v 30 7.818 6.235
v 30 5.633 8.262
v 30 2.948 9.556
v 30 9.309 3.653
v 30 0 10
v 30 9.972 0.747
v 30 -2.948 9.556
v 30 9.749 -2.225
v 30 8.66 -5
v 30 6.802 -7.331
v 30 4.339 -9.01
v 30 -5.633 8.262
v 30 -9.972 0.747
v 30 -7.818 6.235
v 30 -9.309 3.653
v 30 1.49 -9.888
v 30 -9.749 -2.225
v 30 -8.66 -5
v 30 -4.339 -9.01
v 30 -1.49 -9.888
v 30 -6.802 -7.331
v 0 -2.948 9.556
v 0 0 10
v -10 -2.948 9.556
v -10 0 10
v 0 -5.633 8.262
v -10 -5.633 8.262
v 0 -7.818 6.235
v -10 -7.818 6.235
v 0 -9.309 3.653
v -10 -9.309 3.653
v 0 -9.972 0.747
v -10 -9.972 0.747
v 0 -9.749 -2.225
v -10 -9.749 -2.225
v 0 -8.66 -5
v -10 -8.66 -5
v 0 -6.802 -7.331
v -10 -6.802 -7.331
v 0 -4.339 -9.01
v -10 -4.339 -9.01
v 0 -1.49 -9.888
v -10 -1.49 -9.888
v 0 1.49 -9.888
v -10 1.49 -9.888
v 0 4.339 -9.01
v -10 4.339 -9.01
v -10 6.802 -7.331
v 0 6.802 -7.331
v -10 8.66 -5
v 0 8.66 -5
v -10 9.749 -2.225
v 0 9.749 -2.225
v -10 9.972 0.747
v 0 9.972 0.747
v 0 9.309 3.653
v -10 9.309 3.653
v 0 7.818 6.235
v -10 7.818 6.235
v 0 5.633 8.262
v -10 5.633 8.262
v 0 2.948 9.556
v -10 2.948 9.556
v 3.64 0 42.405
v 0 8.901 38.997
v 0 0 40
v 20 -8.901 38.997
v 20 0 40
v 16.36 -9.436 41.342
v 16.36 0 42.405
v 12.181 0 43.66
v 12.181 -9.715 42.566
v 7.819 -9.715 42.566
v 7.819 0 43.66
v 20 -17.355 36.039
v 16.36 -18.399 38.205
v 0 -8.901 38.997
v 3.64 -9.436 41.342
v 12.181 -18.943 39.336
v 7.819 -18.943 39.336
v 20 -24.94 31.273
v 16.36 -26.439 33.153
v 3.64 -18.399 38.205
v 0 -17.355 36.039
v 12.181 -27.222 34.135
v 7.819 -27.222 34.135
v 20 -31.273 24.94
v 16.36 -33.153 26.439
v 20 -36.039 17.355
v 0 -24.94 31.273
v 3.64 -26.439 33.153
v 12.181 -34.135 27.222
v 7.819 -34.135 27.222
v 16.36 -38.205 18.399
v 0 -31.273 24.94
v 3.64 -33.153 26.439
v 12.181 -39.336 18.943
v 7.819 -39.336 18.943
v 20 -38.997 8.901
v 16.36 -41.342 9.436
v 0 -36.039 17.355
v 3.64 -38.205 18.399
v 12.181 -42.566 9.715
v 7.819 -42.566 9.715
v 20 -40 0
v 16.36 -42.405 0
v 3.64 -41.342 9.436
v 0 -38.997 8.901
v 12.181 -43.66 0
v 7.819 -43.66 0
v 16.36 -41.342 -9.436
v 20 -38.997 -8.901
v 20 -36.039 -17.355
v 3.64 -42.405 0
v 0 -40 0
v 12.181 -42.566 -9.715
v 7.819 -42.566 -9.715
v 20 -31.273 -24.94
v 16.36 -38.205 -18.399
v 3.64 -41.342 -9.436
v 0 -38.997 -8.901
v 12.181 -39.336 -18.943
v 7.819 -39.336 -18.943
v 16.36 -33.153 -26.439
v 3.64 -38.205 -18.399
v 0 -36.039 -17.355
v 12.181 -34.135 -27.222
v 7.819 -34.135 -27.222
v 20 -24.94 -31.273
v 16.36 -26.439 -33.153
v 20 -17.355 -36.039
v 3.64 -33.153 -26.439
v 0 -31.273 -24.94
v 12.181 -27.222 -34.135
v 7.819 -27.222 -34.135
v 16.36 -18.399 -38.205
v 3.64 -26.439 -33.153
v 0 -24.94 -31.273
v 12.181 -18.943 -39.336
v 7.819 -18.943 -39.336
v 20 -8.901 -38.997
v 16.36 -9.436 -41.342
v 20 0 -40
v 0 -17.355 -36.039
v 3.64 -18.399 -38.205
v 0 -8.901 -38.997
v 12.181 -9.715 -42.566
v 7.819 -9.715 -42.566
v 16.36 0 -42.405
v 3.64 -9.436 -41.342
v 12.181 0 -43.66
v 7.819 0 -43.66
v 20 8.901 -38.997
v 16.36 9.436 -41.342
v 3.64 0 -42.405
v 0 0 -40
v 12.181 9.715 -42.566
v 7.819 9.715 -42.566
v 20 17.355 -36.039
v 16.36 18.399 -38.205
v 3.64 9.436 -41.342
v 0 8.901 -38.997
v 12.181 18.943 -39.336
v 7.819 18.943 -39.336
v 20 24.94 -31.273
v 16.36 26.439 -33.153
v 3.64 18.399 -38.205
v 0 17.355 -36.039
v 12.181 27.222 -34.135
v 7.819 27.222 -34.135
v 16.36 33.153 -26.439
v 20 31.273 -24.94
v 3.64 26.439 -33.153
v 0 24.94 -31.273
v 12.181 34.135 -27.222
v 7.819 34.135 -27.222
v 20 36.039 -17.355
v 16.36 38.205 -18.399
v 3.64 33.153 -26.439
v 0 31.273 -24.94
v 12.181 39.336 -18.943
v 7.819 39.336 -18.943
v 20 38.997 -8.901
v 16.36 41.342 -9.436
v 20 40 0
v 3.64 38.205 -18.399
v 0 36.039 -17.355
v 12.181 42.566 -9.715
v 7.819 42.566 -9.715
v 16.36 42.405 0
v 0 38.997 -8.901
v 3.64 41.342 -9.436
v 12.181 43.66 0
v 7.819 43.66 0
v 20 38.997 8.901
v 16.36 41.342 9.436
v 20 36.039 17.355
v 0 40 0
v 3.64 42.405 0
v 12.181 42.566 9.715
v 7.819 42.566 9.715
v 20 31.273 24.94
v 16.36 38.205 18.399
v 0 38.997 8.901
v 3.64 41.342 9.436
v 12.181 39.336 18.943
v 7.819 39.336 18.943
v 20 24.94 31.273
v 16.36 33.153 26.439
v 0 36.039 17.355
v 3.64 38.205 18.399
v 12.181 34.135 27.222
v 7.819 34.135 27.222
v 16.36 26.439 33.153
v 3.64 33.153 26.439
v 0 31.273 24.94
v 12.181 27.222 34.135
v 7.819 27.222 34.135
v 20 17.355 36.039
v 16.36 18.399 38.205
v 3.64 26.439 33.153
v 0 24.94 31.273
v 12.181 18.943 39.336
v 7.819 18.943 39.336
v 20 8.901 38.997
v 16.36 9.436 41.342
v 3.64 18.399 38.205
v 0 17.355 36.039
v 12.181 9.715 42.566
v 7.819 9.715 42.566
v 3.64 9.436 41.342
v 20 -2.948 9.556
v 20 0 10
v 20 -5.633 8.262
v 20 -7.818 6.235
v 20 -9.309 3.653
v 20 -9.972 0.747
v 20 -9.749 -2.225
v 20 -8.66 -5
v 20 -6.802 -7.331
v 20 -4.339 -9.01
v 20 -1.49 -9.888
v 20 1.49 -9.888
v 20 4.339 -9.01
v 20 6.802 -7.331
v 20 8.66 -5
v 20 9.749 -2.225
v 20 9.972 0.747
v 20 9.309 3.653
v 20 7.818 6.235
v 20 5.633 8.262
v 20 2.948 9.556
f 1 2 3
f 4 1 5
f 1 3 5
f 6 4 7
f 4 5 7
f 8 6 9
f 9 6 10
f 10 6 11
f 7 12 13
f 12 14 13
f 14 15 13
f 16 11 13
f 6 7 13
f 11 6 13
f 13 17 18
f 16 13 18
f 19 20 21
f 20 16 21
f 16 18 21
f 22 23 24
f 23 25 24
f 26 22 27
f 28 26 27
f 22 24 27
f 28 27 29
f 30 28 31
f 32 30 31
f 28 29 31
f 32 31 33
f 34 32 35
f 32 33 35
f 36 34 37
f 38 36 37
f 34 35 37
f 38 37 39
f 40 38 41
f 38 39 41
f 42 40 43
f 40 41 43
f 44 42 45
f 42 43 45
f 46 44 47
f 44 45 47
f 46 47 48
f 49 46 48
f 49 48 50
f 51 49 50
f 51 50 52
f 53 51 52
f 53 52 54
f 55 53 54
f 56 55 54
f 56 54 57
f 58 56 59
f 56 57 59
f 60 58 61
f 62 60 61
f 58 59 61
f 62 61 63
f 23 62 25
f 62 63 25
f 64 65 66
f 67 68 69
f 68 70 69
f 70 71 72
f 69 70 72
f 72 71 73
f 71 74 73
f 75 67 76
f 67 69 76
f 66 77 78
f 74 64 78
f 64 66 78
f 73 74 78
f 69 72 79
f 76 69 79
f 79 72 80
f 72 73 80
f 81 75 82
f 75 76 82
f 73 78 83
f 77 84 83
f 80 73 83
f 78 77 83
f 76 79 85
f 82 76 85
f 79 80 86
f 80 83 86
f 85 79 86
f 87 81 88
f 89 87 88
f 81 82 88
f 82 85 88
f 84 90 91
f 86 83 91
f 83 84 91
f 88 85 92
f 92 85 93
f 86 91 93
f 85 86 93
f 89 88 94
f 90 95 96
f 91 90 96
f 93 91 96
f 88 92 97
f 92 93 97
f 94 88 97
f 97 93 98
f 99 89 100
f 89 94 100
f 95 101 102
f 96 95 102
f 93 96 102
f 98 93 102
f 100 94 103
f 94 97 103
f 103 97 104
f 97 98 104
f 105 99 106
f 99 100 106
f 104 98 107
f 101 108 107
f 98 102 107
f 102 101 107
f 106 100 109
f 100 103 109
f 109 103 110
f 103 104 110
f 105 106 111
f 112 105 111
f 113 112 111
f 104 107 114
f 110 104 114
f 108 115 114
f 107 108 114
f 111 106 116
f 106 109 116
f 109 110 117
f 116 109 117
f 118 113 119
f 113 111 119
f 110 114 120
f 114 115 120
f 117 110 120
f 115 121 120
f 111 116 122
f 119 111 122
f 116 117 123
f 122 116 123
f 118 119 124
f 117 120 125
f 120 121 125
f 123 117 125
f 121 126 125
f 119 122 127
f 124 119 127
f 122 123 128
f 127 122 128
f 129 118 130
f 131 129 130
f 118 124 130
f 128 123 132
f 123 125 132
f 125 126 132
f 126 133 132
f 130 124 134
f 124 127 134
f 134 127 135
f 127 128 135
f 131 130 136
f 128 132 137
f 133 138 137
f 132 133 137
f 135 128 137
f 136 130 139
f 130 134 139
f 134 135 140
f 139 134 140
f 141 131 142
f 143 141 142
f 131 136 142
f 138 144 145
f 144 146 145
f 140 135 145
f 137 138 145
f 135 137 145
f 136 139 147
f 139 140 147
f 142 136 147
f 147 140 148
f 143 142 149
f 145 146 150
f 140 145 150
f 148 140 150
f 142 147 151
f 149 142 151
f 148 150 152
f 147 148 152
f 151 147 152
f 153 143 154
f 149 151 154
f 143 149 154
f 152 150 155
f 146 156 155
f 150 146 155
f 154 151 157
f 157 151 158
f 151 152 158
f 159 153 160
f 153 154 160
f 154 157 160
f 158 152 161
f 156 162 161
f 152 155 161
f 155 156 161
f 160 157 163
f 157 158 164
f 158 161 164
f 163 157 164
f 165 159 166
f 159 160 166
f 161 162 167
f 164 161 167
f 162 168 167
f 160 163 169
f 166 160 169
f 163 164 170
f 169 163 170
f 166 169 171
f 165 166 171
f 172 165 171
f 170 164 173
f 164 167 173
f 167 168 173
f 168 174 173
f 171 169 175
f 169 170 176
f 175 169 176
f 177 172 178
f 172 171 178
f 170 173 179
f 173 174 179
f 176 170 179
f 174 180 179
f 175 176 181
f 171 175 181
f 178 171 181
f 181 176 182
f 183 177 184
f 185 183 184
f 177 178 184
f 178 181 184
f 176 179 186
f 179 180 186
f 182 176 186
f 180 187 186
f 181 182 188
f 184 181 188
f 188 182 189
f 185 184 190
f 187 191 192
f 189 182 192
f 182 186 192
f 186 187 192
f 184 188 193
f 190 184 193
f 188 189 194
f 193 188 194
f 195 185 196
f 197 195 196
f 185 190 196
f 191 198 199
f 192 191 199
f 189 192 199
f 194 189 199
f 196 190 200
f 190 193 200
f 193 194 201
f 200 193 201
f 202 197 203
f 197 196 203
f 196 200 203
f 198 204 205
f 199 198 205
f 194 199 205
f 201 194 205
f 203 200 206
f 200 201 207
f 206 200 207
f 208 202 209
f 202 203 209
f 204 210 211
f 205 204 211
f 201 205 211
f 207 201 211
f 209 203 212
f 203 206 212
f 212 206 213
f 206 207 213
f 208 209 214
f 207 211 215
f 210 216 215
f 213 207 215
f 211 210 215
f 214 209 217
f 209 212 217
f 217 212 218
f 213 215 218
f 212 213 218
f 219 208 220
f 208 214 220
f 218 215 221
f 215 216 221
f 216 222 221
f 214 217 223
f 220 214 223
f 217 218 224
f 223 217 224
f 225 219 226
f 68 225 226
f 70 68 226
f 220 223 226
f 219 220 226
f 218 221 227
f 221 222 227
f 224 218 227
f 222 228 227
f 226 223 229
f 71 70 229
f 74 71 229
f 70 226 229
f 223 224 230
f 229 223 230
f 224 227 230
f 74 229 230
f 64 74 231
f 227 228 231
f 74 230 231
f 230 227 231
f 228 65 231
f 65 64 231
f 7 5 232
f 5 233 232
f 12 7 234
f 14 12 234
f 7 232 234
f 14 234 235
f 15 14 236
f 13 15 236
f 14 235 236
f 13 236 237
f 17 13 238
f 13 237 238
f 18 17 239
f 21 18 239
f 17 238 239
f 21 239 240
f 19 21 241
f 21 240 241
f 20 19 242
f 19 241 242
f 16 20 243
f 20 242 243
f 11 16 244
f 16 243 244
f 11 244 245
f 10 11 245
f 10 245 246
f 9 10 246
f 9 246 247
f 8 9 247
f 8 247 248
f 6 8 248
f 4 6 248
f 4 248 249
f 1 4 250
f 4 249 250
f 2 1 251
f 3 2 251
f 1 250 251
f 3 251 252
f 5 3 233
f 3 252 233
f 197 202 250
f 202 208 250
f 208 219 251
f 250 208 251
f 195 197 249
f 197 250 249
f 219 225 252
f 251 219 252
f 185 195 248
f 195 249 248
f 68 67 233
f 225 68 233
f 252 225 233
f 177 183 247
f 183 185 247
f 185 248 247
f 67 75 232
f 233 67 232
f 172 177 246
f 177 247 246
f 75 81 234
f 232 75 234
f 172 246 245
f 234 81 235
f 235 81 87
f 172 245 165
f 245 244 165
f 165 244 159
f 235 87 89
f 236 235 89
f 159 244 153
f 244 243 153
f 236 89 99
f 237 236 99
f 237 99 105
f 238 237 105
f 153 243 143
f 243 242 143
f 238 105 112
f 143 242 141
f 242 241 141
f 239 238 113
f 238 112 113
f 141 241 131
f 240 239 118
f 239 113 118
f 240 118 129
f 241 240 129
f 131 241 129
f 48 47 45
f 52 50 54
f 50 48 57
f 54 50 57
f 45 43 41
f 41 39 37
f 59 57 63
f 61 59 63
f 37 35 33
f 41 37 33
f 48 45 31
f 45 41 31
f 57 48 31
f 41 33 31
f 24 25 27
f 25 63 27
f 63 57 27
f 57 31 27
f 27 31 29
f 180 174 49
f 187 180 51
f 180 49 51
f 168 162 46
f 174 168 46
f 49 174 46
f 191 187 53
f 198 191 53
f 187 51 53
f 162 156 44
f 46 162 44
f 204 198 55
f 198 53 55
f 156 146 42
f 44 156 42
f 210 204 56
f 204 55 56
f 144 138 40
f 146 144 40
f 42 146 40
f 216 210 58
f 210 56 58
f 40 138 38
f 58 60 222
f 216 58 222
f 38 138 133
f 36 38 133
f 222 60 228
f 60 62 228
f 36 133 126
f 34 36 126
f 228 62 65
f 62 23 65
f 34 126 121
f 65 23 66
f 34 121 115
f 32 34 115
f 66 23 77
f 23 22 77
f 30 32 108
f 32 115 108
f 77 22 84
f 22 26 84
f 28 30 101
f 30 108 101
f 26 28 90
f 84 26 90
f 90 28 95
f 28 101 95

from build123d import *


with BuildPart() as part:
    # 草图1 → 旋转1 (revolve)
    with BuildSketch(Plane.XY, mode=Mode.PRIVATE) as revolve_1_sk:
        with BuildLine():
            Line((20, 0), (30, 0))
            Line((30, 0), (30, 10))
            Line((30, 10), (20, 10))
            Line((20, 10), (20, 40))
            ThreePointArc((20, 40), (10, 43.819660113), (0, 40))
            Line((0, 40), (0, 10))
            Line((0, 10), (-10, 10))
            Line((-10, 10), (-10, 0))
            Line((-10, 0), (0, 0))
            Line((0, 0), (20, 0))
        make_face()
    revolve(revolve_1_sk.sketch.rotate(Axis((0, 0, 0), (1, 0, 0)), 90), axis=Axis((0, 0, 0), (1, 0, 0)))


solid = part.part
